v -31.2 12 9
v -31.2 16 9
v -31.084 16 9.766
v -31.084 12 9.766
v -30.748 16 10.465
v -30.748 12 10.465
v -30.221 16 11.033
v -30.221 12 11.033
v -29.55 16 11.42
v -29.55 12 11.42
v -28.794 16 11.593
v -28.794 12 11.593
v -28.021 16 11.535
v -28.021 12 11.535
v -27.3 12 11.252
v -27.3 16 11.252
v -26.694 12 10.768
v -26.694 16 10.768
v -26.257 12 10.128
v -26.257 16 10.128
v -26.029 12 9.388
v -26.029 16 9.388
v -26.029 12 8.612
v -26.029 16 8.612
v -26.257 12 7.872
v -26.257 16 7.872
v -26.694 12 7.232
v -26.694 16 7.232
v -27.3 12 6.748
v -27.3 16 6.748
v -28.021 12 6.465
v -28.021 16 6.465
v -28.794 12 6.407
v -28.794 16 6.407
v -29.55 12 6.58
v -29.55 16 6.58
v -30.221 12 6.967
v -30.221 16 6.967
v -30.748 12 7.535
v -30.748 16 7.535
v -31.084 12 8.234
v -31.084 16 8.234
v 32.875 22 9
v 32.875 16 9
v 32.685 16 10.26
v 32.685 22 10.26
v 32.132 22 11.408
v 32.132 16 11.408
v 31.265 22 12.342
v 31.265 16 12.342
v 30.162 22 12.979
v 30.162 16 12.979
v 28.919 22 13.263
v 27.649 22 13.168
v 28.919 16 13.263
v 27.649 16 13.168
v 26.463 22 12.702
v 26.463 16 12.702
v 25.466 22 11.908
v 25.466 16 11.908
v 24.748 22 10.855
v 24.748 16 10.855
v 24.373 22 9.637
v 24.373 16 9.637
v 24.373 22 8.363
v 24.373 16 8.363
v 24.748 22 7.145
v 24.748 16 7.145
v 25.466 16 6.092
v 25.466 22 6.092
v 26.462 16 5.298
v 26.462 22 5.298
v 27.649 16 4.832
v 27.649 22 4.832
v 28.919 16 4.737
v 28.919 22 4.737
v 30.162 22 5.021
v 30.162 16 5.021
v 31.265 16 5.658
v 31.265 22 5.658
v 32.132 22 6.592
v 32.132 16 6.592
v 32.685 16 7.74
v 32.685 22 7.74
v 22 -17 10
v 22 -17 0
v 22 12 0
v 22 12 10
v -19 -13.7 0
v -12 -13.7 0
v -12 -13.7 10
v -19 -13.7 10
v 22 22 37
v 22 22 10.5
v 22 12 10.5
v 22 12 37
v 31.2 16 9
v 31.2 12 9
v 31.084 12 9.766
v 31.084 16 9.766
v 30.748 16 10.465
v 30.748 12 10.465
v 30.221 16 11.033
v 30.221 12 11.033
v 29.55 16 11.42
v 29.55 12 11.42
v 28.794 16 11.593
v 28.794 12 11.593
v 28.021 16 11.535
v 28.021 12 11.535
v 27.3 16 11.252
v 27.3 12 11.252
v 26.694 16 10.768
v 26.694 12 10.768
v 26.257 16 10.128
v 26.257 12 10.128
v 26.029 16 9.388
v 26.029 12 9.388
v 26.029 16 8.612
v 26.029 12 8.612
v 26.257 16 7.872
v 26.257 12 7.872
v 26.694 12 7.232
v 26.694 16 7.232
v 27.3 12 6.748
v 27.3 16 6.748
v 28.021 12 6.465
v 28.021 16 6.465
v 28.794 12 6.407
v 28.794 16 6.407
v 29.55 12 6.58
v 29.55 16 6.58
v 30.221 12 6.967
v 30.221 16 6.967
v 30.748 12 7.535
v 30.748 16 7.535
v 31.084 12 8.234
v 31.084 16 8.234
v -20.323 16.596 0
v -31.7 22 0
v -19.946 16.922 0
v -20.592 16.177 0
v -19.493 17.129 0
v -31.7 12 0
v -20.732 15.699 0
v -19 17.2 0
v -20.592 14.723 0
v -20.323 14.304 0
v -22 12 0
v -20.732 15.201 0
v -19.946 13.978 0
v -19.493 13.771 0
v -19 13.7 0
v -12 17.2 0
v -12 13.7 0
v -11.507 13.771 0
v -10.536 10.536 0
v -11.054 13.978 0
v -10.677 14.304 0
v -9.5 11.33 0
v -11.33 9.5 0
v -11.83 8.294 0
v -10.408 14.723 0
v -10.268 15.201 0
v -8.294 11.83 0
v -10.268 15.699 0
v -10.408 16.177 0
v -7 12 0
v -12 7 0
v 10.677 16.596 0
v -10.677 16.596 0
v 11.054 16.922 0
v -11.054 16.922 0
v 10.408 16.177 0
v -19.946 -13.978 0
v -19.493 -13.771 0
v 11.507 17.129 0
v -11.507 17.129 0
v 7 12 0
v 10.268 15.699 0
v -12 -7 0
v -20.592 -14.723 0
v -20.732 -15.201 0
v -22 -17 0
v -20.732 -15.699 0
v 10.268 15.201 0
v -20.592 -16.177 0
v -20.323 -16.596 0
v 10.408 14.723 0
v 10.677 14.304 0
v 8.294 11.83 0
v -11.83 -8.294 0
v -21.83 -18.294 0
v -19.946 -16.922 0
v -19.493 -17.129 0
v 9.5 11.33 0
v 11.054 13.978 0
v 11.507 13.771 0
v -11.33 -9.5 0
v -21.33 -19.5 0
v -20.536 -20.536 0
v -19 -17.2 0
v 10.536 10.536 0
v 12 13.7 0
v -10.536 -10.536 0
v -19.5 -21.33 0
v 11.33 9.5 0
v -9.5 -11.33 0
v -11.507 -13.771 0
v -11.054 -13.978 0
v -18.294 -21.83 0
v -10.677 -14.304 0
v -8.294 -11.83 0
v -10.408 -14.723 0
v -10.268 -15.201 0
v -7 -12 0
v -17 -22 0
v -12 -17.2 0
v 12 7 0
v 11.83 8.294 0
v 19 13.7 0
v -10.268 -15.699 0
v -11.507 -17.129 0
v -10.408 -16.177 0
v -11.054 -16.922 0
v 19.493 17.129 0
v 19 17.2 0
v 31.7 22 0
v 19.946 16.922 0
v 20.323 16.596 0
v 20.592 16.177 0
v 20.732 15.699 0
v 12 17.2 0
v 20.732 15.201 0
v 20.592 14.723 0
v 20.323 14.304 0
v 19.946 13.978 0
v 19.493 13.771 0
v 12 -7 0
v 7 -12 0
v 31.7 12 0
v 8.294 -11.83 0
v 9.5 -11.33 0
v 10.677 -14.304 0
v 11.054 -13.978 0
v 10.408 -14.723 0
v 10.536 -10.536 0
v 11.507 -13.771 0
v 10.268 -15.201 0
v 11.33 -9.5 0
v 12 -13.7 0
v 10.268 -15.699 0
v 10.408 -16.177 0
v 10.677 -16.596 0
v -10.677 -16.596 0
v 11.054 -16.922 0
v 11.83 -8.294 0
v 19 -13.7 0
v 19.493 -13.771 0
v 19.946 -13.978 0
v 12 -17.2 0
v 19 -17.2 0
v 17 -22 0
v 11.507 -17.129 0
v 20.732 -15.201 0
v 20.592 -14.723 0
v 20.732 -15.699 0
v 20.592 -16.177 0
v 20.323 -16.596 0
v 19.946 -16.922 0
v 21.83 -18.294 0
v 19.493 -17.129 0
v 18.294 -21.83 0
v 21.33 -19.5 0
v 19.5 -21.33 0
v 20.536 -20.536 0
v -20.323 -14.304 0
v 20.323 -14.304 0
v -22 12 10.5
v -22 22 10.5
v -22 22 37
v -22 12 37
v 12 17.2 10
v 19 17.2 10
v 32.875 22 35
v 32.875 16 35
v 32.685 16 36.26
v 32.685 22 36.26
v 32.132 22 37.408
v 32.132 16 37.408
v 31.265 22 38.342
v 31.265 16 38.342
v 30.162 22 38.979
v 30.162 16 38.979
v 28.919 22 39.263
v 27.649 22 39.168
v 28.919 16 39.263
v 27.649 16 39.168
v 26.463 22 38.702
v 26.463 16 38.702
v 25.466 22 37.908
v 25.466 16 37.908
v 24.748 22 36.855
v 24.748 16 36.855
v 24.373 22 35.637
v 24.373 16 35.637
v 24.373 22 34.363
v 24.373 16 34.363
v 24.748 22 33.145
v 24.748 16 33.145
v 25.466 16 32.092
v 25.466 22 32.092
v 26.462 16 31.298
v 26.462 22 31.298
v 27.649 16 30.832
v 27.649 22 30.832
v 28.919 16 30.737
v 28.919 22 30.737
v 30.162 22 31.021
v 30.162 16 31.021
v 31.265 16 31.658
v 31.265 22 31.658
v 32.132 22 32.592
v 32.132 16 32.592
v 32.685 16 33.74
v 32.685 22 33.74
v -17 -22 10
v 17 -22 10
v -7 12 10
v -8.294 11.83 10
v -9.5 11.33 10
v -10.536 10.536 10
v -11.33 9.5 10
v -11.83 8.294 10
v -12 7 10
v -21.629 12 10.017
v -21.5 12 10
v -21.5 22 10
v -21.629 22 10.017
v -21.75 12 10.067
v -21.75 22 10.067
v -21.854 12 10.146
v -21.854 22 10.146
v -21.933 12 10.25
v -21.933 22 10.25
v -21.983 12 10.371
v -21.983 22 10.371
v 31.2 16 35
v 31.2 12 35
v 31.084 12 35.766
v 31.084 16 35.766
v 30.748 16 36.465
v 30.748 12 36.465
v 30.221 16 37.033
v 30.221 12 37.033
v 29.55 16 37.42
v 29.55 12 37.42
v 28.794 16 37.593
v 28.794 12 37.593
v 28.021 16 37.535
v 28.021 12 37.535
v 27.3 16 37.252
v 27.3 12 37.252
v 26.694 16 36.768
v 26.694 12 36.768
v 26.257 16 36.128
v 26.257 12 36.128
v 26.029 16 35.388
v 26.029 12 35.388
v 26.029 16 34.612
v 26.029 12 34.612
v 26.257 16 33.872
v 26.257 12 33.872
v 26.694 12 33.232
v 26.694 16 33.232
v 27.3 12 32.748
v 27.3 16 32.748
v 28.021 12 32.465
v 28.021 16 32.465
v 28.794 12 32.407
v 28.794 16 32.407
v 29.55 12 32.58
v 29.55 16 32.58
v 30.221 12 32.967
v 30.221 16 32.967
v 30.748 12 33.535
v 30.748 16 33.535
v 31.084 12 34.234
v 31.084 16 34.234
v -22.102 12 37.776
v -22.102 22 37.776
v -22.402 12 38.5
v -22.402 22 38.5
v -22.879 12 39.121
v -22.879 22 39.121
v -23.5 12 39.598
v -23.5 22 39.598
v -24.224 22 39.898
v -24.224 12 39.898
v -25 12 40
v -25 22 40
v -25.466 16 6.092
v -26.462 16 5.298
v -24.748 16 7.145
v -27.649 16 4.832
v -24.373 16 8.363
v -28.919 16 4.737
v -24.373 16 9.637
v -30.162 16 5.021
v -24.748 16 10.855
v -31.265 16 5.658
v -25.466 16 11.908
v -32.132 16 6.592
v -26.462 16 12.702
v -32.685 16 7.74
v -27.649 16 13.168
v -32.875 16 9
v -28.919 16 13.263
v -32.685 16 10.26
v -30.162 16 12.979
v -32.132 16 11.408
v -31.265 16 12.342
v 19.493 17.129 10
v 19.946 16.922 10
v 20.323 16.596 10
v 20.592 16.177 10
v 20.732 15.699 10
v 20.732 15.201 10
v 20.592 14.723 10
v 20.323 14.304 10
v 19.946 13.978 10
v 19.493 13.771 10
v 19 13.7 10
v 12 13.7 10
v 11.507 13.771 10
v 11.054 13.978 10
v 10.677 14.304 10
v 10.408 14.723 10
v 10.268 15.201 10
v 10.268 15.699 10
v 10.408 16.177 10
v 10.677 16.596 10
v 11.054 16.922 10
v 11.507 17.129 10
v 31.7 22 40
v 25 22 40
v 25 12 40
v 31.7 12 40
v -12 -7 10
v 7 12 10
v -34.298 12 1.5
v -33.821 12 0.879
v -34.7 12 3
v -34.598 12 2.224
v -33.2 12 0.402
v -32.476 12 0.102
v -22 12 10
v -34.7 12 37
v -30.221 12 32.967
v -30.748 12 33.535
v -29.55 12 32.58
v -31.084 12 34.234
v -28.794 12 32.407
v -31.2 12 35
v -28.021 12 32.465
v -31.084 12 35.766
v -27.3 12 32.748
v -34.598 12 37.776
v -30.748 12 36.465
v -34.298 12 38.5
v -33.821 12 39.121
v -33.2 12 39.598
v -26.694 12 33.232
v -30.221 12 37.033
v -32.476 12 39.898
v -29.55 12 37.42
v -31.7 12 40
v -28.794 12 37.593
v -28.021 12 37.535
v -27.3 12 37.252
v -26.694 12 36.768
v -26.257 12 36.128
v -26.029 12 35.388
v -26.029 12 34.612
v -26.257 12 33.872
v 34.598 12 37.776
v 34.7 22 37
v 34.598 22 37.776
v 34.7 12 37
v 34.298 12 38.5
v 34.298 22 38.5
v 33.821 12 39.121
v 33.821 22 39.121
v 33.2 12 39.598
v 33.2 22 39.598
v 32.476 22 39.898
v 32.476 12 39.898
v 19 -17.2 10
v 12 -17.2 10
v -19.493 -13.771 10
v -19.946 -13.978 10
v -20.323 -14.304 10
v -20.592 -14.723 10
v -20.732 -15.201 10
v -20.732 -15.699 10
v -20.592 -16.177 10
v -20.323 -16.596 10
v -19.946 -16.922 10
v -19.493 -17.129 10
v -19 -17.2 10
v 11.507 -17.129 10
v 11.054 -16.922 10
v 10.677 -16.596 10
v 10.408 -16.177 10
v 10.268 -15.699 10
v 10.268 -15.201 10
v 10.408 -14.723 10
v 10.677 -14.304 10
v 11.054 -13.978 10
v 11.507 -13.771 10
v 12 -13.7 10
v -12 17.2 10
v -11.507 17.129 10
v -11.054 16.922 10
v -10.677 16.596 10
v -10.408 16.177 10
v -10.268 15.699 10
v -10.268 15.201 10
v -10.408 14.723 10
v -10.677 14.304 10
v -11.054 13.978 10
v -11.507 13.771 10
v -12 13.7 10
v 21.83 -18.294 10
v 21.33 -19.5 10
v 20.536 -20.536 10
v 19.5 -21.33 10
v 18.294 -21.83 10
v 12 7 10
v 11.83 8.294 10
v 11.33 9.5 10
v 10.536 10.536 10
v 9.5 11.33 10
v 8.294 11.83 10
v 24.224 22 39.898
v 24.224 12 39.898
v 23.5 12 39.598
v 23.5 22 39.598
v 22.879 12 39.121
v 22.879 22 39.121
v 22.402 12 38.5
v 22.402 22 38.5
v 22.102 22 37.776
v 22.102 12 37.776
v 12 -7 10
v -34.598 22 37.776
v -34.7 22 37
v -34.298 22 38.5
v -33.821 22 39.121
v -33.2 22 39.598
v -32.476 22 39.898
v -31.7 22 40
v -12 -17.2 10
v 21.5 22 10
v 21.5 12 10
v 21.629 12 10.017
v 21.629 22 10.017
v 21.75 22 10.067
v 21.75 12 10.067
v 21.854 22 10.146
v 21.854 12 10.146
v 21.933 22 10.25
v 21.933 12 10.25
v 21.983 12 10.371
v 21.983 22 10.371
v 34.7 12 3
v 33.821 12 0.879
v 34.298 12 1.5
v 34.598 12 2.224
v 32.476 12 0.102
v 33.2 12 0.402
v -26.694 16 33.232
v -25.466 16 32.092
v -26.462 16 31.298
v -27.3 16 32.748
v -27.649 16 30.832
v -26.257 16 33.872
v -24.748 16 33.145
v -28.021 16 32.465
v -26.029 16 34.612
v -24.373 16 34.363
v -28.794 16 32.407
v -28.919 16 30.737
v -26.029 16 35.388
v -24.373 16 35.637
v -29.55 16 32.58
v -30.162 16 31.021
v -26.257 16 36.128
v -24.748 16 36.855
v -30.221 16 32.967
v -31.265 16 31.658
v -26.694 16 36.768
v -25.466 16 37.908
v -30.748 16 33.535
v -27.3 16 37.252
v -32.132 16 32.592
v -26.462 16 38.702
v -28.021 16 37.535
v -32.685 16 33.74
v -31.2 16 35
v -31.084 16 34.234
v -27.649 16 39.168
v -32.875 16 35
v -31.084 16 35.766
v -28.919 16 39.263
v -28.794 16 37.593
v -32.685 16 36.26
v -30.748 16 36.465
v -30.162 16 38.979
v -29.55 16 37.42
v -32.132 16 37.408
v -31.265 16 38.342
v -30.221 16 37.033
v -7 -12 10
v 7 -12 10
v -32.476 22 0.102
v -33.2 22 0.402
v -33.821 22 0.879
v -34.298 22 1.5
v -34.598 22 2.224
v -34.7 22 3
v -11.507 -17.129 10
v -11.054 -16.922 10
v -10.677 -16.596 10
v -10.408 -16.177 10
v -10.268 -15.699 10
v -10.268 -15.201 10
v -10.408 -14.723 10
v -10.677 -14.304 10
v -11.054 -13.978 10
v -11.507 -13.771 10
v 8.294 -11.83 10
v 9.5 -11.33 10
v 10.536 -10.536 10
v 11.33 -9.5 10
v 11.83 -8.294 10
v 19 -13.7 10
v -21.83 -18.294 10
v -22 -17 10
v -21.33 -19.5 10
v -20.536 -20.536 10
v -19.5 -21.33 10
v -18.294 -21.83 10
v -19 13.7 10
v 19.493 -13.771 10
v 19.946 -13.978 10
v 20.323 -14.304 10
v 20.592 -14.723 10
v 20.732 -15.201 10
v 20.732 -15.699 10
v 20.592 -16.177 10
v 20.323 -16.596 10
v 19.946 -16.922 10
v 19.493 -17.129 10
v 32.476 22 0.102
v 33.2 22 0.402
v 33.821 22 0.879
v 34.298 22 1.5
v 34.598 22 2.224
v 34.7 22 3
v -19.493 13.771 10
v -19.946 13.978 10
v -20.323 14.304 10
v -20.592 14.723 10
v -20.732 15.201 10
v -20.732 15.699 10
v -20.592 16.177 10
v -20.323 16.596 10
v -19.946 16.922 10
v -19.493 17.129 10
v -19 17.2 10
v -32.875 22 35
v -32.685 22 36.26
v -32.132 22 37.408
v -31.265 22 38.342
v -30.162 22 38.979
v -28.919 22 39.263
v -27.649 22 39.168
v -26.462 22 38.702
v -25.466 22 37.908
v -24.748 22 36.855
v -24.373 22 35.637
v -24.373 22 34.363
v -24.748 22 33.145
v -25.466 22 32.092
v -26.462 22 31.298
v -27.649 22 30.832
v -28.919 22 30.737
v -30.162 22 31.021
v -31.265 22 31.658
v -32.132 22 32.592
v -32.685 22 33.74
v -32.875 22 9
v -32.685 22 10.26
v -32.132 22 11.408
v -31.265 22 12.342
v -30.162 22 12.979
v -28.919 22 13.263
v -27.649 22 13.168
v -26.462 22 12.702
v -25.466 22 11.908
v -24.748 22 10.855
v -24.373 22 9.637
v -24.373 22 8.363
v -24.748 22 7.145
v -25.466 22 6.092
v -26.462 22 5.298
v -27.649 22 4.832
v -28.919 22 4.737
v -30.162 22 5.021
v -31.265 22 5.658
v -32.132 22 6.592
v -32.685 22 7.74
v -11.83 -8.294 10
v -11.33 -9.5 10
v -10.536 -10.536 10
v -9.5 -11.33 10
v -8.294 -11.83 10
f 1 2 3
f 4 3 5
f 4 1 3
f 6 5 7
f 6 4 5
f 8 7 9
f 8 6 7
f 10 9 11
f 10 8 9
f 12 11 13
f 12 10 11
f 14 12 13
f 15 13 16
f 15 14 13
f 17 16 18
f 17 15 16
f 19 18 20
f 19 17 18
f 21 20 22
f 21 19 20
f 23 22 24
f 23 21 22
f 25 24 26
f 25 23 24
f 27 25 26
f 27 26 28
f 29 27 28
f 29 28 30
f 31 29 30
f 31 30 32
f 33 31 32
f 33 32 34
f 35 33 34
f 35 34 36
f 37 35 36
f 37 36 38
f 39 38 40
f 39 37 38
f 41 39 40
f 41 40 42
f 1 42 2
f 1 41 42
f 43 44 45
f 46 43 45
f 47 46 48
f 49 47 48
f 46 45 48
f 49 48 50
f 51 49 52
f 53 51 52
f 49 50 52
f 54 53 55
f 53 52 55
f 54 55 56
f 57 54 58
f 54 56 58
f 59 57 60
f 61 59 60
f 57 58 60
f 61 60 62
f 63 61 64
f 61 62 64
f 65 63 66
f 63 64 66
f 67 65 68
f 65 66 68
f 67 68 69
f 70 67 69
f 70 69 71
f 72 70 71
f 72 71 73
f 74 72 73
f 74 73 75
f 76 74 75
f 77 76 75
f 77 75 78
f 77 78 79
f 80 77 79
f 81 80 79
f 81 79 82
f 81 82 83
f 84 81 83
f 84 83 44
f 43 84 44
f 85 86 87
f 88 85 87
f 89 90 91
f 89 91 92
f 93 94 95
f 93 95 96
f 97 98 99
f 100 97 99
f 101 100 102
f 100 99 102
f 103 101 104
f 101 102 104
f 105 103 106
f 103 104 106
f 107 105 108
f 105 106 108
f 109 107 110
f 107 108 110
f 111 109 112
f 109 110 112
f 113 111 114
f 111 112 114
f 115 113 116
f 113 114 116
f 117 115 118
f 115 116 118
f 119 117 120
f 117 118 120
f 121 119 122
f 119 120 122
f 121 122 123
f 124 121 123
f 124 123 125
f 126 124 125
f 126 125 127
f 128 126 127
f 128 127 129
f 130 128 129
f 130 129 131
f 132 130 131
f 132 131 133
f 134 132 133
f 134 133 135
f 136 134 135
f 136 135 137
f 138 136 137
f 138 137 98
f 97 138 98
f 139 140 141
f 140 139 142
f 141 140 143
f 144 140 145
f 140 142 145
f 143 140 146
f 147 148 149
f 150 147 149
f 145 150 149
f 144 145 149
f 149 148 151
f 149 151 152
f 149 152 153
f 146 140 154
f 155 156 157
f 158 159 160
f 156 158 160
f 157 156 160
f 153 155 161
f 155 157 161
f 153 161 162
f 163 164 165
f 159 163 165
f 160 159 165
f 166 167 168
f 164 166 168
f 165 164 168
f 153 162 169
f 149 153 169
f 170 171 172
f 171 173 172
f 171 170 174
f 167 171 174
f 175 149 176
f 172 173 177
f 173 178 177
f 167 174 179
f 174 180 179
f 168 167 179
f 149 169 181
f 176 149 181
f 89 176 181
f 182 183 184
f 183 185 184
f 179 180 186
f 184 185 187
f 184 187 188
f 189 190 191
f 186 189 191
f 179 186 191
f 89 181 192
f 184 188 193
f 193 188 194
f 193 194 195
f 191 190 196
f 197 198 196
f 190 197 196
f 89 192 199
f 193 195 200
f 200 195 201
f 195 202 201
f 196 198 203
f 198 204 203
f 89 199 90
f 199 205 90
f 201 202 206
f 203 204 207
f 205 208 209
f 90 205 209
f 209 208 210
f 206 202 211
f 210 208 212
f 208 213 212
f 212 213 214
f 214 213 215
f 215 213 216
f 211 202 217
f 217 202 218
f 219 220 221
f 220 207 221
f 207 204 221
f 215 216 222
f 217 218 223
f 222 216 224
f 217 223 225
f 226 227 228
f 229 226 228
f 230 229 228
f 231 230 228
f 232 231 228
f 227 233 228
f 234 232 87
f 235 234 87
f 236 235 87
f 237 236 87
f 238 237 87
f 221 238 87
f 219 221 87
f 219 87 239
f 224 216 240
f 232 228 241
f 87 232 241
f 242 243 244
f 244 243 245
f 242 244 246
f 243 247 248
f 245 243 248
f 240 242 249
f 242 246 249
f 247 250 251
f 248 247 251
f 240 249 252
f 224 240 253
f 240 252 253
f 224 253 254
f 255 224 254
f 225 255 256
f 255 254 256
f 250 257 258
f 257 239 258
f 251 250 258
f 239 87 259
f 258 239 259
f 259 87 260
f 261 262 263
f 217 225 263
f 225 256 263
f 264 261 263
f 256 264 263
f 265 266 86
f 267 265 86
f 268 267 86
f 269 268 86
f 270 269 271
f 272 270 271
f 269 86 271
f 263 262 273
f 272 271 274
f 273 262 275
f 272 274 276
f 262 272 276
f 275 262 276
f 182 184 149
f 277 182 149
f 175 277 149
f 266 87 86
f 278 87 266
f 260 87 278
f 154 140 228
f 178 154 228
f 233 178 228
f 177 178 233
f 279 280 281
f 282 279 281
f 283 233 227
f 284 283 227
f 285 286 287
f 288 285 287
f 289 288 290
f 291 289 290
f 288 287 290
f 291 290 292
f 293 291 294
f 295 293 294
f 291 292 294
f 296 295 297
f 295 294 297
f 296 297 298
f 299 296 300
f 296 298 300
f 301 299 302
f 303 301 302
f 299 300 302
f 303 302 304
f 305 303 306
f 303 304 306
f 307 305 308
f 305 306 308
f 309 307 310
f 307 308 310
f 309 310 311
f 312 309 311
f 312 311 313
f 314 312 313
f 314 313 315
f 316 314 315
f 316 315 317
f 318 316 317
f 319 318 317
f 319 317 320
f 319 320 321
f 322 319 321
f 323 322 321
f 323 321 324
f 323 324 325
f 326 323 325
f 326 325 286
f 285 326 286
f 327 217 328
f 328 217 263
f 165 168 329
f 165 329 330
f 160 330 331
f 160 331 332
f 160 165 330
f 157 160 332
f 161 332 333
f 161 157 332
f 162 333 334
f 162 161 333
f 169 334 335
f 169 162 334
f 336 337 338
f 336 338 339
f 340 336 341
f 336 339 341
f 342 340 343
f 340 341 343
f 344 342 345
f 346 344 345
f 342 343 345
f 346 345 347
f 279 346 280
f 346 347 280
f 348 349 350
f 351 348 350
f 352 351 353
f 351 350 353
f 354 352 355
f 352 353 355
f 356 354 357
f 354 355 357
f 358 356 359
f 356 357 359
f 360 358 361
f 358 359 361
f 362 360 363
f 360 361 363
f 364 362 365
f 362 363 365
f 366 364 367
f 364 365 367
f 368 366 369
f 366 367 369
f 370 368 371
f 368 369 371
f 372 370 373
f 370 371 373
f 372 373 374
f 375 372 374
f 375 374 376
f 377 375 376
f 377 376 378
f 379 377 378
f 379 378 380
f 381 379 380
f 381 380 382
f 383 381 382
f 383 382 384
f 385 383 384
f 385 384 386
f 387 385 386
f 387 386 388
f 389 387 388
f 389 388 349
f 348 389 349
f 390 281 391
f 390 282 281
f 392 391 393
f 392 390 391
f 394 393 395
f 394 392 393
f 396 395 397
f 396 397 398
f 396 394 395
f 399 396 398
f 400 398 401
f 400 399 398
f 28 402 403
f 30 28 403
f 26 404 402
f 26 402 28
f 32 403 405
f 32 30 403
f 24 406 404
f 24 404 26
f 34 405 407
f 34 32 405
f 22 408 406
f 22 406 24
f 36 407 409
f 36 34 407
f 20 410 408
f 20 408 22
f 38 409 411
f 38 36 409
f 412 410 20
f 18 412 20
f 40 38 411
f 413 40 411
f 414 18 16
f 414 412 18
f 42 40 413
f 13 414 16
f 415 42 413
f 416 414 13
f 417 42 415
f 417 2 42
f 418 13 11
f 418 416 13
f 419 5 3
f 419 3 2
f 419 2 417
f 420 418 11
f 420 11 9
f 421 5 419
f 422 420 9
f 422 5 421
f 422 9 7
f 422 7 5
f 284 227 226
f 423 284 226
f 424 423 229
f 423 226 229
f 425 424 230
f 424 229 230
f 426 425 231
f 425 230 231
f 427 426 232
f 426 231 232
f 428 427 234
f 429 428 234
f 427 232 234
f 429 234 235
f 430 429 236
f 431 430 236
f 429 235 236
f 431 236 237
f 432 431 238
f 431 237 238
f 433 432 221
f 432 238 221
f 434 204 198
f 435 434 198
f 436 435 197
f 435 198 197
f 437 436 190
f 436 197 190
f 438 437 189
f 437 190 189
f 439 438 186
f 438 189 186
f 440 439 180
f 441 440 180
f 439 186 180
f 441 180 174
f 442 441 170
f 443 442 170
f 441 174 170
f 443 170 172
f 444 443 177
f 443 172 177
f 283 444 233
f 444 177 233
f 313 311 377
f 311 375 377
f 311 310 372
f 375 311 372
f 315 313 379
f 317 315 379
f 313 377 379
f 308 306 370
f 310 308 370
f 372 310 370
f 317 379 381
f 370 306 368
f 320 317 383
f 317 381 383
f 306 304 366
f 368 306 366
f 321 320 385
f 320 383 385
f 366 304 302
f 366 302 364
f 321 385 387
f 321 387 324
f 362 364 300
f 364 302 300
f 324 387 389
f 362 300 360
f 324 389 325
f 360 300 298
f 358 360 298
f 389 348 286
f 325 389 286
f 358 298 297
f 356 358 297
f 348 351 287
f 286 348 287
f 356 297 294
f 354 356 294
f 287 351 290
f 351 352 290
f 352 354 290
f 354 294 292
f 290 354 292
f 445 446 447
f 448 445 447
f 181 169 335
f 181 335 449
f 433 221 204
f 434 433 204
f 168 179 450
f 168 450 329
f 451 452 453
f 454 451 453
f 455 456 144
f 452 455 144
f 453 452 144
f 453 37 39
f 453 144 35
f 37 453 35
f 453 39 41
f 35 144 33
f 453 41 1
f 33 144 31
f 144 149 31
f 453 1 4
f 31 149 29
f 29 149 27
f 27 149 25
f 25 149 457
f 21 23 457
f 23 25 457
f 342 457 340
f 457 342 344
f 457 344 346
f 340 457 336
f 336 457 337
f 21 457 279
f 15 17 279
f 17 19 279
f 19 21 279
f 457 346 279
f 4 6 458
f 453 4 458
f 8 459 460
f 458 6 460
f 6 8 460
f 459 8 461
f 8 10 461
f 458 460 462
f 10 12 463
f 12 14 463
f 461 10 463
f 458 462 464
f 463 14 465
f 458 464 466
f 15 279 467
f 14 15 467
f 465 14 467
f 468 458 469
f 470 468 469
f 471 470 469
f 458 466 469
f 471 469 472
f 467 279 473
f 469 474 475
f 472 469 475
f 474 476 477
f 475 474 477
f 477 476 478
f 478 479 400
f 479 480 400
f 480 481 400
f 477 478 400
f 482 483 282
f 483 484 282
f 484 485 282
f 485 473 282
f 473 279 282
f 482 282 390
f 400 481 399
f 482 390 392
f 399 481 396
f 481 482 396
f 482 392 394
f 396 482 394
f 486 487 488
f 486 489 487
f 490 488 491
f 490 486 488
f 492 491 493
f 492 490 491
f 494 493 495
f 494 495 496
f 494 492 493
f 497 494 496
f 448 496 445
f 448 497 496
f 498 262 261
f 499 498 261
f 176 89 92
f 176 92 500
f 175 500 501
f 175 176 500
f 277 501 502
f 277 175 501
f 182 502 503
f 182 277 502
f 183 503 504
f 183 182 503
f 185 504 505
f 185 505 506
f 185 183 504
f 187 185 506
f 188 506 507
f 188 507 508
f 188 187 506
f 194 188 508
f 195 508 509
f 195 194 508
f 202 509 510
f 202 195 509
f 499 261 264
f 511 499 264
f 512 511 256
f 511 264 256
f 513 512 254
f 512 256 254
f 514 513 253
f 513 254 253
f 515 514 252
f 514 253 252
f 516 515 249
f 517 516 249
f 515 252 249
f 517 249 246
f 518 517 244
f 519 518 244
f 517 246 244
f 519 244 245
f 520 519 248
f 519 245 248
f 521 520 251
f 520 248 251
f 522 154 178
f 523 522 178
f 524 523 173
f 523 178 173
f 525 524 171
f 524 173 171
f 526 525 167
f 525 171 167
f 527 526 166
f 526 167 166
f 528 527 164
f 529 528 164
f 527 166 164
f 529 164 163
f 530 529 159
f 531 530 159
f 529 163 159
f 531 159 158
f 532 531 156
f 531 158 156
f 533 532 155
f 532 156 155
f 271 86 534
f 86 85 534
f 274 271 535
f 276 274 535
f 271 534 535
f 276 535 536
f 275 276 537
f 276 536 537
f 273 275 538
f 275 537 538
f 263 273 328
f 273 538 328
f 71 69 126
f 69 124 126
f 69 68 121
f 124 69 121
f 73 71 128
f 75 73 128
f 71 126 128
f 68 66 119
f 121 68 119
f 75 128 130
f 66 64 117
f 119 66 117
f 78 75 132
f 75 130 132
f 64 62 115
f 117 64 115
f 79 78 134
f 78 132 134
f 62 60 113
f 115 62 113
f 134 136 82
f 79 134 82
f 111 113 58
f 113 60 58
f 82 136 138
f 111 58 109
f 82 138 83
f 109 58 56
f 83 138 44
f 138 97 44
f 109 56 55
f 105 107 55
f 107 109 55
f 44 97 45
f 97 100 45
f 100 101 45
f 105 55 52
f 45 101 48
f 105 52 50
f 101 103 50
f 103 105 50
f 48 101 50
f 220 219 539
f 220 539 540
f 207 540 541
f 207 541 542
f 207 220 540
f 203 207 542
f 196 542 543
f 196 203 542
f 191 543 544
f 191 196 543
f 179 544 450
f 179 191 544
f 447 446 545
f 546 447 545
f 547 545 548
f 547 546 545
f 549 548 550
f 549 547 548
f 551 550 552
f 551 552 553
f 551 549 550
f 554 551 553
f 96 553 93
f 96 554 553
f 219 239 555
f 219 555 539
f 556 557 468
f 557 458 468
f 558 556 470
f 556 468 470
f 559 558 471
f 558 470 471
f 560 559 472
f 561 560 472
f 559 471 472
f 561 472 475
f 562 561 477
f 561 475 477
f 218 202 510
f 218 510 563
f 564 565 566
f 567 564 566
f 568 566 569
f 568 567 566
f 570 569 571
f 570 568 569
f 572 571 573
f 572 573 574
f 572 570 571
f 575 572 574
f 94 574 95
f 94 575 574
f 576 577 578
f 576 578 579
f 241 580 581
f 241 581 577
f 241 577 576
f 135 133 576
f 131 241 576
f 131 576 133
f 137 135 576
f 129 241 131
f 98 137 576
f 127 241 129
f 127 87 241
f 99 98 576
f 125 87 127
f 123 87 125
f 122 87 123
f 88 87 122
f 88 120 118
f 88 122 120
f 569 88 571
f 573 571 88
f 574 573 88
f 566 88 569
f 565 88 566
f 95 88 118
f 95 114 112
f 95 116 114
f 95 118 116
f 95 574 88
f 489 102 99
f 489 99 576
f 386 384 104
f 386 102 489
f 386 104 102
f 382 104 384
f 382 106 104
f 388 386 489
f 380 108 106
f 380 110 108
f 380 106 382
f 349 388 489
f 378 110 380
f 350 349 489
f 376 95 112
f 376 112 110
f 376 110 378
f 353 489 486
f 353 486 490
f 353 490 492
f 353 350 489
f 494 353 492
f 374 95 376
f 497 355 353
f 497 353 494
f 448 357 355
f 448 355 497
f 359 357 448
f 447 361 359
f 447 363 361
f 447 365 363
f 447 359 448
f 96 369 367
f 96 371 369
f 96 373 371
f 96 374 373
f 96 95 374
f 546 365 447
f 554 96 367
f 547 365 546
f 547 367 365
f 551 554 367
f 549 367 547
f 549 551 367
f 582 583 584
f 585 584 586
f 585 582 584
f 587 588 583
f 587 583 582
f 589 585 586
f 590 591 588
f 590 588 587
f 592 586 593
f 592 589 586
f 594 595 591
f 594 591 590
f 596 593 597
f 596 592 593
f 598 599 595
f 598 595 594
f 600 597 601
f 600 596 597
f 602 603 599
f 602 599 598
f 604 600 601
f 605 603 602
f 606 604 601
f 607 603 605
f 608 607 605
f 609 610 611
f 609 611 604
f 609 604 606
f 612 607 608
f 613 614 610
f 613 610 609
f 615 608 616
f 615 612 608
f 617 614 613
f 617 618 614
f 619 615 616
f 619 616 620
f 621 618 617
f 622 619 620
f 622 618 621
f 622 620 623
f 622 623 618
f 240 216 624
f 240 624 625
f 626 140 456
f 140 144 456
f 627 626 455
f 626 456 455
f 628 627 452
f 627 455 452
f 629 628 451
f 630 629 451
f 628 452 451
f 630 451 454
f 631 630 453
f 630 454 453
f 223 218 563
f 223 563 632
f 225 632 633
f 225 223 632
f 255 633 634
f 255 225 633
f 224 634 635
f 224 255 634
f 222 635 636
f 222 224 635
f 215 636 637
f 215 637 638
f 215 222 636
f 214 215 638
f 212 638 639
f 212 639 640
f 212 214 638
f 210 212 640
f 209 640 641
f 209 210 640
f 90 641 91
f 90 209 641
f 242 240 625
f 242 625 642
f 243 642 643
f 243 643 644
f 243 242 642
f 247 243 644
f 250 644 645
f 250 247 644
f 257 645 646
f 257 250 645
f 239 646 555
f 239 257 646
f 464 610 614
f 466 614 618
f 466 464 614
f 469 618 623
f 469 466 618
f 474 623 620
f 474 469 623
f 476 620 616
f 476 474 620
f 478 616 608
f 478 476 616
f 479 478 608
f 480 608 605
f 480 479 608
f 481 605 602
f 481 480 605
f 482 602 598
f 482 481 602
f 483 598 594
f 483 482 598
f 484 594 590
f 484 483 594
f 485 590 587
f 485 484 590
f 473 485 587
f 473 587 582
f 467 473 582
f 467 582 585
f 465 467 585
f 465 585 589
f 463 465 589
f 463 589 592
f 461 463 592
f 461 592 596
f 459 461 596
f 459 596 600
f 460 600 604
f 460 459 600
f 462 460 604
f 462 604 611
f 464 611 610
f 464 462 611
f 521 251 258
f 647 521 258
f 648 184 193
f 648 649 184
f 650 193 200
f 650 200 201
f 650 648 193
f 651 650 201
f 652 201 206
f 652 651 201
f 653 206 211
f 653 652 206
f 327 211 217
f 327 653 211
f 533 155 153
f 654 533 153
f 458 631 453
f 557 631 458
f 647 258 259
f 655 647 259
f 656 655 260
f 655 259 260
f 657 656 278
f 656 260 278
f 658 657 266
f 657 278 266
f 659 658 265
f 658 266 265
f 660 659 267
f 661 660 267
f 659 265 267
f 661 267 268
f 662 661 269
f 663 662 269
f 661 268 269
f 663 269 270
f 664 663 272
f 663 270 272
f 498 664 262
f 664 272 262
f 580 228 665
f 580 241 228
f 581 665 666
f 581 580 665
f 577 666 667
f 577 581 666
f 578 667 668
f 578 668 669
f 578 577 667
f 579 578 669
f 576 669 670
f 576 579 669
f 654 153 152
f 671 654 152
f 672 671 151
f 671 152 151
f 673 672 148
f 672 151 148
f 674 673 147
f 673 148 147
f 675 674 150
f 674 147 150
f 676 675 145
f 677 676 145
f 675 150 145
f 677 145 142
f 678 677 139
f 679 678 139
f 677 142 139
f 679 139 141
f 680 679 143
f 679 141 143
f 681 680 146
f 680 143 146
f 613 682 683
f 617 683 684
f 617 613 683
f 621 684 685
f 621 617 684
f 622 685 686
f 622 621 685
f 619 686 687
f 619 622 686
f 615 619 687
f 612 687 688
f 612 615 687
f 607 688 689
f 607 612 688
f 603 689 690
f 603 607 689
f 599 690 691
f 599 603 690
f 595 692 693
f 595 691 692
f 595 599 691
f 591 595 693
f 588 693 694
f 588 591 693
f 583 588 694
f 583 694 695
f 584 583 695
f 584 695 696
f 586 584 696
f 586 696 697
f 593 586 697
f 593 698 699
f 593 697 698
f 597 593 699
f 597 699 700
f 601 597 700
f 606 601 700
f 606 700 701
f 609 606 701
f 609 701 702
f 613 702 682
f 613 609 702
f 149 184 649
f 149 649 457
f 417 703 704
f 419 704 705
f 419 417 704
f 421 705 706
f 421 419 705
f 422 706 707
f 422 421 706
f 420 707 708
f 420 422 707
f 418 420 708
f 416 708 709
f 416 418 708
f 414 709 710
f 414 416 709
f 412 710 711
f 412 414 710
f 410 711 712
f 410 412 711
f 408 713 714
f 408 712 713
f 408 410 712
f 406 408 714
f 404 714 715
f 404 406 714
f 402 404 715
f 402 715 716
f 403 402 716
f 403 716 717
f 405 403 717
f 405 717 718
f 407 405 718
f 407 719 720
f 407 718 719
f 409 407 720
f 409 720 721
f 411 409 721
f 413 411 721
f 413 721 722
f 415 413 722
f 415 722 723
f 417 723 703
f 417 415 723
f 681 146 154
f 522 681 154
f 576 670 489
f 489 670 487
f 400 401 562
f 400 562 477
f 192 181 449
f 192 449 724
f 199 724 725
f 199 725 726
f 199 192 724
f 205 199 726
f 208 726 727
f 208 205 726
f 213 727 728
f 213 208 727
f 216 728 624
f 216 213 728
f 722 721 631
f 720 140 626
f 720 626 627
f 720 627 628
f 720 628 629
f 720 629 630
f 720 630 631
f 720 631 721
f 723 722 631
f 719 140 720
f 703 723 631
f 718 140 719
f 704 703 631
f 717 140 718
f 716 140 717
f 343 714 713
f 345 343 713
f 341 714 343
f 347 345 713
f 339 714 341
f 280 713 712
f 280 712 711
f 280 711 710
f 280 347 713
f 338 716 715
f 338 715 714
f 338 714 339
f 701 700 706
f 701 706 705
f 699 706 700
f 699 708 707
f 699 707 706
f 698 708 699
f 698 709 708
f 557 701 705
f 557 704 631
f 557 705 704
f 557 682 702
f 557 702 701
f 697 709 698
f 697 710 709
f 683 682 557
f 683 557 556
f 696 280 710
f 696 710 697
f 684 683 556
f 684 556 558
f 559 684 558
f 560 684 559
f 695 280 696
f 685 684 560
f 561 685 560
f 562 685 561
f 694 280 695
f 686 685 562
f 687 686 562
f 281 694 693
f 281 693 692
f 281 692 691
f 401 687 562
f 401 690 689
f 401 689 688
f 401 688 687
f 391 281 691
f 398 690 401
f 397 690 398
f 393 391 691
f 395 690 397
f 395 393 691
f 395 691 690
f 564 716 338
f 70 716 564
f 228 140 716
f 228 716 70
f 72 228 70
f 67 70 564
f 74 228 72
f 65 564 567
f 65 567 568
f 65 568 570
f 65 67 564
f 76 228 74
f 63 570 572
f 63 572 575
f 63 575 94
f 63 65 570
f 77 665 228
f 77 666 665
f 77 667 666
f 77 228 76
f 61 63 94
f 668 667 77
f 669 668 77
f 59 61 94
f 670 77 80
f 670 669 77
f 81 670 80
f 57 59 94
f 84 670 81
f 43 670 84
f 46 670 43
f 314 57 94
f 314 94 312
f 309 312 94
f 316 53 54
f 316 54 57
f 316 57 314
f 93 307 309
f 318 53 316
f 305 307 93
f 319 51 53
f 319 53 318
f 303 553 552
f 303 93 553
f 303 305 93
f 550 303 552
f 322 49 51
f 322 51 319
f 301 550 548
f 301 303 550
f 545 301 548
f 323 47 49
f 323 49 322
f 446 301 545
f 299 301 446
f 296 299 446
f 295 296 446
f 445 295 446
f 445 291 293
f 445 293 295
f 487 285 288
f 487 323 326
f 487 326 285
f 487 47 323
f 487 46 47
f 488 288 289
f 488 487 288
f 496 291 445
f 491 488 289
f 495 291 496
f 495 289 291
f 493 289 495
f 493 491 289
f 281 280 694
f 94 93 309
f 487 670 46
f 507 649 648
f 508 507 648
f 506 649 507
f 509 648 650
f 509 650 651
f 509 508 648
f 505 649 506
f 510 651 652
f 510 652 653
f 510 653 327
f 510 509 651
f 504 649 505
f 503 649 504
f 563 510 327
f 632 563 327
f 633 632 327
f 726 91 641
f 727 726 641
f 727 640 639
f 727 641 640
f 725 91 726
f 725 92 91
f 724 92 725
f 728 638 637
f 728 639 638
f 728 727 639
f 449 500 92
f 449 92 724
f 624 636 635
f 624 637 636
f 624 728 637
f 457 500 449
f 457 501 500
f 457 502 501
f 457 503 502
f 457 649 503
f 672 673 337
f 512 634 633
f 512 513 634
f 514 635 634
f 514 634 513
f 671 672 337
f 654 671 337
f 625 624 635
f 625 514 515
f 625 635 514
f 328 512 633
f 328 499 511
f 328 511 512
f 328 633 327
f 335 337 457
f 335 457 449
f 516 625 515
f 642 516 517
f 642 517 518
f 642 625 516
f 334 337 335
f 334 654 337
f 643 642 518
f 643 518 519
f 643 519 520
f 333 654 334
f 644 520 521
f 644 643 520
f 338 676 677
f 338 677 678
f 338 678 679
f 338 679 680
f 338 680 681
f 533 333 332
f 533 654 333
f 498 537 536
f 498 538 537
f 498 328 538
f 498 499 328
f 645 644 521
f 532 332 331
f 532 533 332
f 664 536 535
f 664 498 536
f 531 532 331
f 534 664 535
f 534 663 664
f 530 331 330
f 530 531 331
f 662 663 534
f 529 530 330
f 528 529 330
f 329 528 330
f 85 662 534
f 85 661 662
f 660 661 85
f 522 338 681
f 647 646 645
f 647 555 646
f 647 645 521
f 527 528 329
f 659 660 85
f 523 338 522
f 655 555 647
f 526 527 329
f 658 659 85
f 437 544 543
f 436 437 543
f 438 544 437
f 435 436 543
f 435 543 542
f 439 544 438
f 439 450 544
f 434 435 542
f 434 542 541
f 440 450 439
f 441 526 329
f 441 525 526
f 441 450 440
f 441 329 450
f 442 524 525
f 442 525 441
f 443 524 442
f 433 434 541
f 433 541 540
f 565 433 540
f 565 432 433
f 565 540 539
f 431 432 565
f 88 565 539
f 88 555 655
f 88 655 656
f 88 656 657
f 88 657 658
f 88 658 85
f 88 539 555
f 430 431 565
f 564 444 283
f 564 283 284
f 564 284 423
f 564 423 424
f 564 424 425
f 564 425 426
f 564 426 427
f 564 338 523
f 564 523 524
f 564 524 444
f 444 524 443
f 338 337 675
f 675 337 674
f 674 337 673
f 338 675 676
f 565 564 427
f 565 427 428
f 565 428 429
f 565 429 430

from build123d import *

# Parameters (mm, degrees)
SKETCH1_W           = 44
SKETCH1_H           = 44
BOSS_EXTRUDE1_DEPTH = 10
BOSS_EXTRUDE2_DEPTH = 12.7
SKETCH3_R           = 2.6
CUT_EXTRUDE1_DEPTH  = 63.929245983
SKETCH4_R           = 4.275
CUT_EXTRUDE2_DEPTH  = 66.177373375
FILLET1_R           = 3
FILLET2_R           = 5
FILLET3_R           = 0.5


with BuildPart() as part:
    # Sketch1 → Boss-Extrude1 (new body)
    with BuildSketch(Plane.XY):
        Rectangle(SKETCH1_W, SKETCH1_H)
        with BuildLine():
            Line((7, 12), (-7, 12))
            ThreePointArc((-7, 12), (-10.535533906, 10.535533906), (-12, 7))
            Line((-12, 7), (-12, -7))
            ThreePointArc((-12, -7), (-10.535533906, -10.535533906), (-7, -12))
            Line((-7, -12), (7, -12))
            ThreePointArc((7, -12), (10.535533906, -10.535533906), (12, -7))
            Line((12, -7), (12, 7))
            ThreePointArc((12, 7), (10.535533906, 10.535533906), (7, 12))
        make_face(mode=Mode.SUBTRACT)
        with BuildLine():
            Line((-19, 17.2), (-12, 17.2))
            ThreePointArc((-12, 17.2), (-10.25, 15.45), (-12, 13.7))
            Line((-12, 13.7), (-19, 13.7))
            ThreePointArc((-19, 13.7), (-20.75, 15.45), (-19, 17.2))
        make_face(mode=Mode.SUBTRACT)
        with BuildLine():
            Line((-19, -17.2), (-12, -17.2))
            ThreePointArc((-12, -17.2), (-10.25, -15.45), (-12, -13.7))
            Line((-12, -13.7), (-19, -13.7))
            ThreePointArc((-19, -13.7), (-20.75, -15.45), (-19, -17.2))
        make_face(mode=Mode.SUBTRACT)
        with BuildLine():
            Line((12, 17.2), (19, 17.2))
            ThreePointArc((19, 17.2), (20.75, 15.45), (19, 13.7))
            Line((19, 13.7), (12, 13.7))
            ThreePointArc((12, 13.7), (10.25, 15.45), (12, 17.2))
        make_face(mode=Mode.SUBTRACT)
        with BuildLine():
            Line((12, -13.7), (19, -13.7))
            ThreePointArc((19, -13.7), (20.75, -15.45), (19, -17.2))
            Line((19, -17.2), (12, -17.2))
            ThreePointArc((12, -17.2), (10.25, -15.45), (12, -13.7))
        make_face(mode=Mode.SUBTRACT)
    extrude(amount=BOSS_EXTRUDE1_DEPTH)

    # Sketch2 → Boss-Extrude2 (add)
    with BuildSketch(Plane(origin=(22, 0, 0), x_dir=(0, 0, -1), z_dir=(1, 0, 0))):
        Polygon((0, 12), (-40, 12), (-40, 16), (-40, 22), (-10, 22), (0, 22), align=None)
    boss_extrude2 = extrude(amount=BOSS_EXTRUDE2_DEPTH)

    # Sketch3 → Cut-Extrude1 (cut, through all)
    with BuildSketch(Plane.XZ.offset(-12)):
        with Locations((28.6, 35)):
            Circle(SKETCH3_R)
        with Locations((28.6, 9)):
            Circle(SKETCH3_R)
    cut_extrude1 = extrude(amount=-CUT_EXTRUDE1_DEPTH, mode=Mode.SUBTRACT)

    # Sketch4 → Cut-Extrude2 (cut, through all)
    with BuildSketch(Plane(origin=(0, 16, 0), x_dir=(-1, 0, 0), z_dir=(0, -1, 0))):
        with Locations(Location((-28.6, -9, 0), (0, 0, 180))):
            Circle(SKETCH4_R)
        with Locations(Location((-28.6, -35, 0), (0, 0, 180))):
            Circle(SKETCH4_R)
    cut_extrude2 = extrude(amount=-CUT_EXTRUDE2_DEPTH, mode=Mode.SUBTRACT)

    # Mirror1: Boss-Extrude2, Cut-Extrude1, Cut-Extrude2 across plane
    add(boss_extrude2.mirror(Plane(origin=(0, 0, 0), x_dir=(0, 0, 1), z_dir=(1, 0, 0))))
    add(cut_extrude1.mirror(Plane(origin=(0, 0, 0), x_dir=(0, 0, 1), z_dir=(1, 0, 0))), mode=Mode.SUBTRACT)
    add(cut_extrude2.mirror(Plane(origin=(0, 0, 0), x_dir=(0, 0, 1), z_dir=(1, 0, 0))), mode=Mode.SUBTRACT)

    # Fillet1
    fillet1_edges = [part.edges().sort_by_distance(p)[0] for p in [
        (34.7, 17, 0),
        (34.7, 17, 40),
        (-34.7, 17, 0),
        (-34.7, 17, 40),
        (-22, 17, 40),
        (22, 17, 40),
    ]]
    fillet(fillet1_edges, radius=FILLET1_R)

    # Fillet2
    fillet2_edges = [part.edges().sort_by_distance(p)[0] for p in [
        (22, -22, 5),
        (-22, -22, 5),
    ]]
    fillet(fillet2_edges, radius=FILLET2_R)

    # Fillet3
    fillet3_edges = [part.edges().sort_by_distance(p)[0] for p in [
        (-22, 17, 10),
        (22, 17, 10),
    ]]
    fillet(fillet3_edges, radius=FILLET3_R)


solid = part.part
